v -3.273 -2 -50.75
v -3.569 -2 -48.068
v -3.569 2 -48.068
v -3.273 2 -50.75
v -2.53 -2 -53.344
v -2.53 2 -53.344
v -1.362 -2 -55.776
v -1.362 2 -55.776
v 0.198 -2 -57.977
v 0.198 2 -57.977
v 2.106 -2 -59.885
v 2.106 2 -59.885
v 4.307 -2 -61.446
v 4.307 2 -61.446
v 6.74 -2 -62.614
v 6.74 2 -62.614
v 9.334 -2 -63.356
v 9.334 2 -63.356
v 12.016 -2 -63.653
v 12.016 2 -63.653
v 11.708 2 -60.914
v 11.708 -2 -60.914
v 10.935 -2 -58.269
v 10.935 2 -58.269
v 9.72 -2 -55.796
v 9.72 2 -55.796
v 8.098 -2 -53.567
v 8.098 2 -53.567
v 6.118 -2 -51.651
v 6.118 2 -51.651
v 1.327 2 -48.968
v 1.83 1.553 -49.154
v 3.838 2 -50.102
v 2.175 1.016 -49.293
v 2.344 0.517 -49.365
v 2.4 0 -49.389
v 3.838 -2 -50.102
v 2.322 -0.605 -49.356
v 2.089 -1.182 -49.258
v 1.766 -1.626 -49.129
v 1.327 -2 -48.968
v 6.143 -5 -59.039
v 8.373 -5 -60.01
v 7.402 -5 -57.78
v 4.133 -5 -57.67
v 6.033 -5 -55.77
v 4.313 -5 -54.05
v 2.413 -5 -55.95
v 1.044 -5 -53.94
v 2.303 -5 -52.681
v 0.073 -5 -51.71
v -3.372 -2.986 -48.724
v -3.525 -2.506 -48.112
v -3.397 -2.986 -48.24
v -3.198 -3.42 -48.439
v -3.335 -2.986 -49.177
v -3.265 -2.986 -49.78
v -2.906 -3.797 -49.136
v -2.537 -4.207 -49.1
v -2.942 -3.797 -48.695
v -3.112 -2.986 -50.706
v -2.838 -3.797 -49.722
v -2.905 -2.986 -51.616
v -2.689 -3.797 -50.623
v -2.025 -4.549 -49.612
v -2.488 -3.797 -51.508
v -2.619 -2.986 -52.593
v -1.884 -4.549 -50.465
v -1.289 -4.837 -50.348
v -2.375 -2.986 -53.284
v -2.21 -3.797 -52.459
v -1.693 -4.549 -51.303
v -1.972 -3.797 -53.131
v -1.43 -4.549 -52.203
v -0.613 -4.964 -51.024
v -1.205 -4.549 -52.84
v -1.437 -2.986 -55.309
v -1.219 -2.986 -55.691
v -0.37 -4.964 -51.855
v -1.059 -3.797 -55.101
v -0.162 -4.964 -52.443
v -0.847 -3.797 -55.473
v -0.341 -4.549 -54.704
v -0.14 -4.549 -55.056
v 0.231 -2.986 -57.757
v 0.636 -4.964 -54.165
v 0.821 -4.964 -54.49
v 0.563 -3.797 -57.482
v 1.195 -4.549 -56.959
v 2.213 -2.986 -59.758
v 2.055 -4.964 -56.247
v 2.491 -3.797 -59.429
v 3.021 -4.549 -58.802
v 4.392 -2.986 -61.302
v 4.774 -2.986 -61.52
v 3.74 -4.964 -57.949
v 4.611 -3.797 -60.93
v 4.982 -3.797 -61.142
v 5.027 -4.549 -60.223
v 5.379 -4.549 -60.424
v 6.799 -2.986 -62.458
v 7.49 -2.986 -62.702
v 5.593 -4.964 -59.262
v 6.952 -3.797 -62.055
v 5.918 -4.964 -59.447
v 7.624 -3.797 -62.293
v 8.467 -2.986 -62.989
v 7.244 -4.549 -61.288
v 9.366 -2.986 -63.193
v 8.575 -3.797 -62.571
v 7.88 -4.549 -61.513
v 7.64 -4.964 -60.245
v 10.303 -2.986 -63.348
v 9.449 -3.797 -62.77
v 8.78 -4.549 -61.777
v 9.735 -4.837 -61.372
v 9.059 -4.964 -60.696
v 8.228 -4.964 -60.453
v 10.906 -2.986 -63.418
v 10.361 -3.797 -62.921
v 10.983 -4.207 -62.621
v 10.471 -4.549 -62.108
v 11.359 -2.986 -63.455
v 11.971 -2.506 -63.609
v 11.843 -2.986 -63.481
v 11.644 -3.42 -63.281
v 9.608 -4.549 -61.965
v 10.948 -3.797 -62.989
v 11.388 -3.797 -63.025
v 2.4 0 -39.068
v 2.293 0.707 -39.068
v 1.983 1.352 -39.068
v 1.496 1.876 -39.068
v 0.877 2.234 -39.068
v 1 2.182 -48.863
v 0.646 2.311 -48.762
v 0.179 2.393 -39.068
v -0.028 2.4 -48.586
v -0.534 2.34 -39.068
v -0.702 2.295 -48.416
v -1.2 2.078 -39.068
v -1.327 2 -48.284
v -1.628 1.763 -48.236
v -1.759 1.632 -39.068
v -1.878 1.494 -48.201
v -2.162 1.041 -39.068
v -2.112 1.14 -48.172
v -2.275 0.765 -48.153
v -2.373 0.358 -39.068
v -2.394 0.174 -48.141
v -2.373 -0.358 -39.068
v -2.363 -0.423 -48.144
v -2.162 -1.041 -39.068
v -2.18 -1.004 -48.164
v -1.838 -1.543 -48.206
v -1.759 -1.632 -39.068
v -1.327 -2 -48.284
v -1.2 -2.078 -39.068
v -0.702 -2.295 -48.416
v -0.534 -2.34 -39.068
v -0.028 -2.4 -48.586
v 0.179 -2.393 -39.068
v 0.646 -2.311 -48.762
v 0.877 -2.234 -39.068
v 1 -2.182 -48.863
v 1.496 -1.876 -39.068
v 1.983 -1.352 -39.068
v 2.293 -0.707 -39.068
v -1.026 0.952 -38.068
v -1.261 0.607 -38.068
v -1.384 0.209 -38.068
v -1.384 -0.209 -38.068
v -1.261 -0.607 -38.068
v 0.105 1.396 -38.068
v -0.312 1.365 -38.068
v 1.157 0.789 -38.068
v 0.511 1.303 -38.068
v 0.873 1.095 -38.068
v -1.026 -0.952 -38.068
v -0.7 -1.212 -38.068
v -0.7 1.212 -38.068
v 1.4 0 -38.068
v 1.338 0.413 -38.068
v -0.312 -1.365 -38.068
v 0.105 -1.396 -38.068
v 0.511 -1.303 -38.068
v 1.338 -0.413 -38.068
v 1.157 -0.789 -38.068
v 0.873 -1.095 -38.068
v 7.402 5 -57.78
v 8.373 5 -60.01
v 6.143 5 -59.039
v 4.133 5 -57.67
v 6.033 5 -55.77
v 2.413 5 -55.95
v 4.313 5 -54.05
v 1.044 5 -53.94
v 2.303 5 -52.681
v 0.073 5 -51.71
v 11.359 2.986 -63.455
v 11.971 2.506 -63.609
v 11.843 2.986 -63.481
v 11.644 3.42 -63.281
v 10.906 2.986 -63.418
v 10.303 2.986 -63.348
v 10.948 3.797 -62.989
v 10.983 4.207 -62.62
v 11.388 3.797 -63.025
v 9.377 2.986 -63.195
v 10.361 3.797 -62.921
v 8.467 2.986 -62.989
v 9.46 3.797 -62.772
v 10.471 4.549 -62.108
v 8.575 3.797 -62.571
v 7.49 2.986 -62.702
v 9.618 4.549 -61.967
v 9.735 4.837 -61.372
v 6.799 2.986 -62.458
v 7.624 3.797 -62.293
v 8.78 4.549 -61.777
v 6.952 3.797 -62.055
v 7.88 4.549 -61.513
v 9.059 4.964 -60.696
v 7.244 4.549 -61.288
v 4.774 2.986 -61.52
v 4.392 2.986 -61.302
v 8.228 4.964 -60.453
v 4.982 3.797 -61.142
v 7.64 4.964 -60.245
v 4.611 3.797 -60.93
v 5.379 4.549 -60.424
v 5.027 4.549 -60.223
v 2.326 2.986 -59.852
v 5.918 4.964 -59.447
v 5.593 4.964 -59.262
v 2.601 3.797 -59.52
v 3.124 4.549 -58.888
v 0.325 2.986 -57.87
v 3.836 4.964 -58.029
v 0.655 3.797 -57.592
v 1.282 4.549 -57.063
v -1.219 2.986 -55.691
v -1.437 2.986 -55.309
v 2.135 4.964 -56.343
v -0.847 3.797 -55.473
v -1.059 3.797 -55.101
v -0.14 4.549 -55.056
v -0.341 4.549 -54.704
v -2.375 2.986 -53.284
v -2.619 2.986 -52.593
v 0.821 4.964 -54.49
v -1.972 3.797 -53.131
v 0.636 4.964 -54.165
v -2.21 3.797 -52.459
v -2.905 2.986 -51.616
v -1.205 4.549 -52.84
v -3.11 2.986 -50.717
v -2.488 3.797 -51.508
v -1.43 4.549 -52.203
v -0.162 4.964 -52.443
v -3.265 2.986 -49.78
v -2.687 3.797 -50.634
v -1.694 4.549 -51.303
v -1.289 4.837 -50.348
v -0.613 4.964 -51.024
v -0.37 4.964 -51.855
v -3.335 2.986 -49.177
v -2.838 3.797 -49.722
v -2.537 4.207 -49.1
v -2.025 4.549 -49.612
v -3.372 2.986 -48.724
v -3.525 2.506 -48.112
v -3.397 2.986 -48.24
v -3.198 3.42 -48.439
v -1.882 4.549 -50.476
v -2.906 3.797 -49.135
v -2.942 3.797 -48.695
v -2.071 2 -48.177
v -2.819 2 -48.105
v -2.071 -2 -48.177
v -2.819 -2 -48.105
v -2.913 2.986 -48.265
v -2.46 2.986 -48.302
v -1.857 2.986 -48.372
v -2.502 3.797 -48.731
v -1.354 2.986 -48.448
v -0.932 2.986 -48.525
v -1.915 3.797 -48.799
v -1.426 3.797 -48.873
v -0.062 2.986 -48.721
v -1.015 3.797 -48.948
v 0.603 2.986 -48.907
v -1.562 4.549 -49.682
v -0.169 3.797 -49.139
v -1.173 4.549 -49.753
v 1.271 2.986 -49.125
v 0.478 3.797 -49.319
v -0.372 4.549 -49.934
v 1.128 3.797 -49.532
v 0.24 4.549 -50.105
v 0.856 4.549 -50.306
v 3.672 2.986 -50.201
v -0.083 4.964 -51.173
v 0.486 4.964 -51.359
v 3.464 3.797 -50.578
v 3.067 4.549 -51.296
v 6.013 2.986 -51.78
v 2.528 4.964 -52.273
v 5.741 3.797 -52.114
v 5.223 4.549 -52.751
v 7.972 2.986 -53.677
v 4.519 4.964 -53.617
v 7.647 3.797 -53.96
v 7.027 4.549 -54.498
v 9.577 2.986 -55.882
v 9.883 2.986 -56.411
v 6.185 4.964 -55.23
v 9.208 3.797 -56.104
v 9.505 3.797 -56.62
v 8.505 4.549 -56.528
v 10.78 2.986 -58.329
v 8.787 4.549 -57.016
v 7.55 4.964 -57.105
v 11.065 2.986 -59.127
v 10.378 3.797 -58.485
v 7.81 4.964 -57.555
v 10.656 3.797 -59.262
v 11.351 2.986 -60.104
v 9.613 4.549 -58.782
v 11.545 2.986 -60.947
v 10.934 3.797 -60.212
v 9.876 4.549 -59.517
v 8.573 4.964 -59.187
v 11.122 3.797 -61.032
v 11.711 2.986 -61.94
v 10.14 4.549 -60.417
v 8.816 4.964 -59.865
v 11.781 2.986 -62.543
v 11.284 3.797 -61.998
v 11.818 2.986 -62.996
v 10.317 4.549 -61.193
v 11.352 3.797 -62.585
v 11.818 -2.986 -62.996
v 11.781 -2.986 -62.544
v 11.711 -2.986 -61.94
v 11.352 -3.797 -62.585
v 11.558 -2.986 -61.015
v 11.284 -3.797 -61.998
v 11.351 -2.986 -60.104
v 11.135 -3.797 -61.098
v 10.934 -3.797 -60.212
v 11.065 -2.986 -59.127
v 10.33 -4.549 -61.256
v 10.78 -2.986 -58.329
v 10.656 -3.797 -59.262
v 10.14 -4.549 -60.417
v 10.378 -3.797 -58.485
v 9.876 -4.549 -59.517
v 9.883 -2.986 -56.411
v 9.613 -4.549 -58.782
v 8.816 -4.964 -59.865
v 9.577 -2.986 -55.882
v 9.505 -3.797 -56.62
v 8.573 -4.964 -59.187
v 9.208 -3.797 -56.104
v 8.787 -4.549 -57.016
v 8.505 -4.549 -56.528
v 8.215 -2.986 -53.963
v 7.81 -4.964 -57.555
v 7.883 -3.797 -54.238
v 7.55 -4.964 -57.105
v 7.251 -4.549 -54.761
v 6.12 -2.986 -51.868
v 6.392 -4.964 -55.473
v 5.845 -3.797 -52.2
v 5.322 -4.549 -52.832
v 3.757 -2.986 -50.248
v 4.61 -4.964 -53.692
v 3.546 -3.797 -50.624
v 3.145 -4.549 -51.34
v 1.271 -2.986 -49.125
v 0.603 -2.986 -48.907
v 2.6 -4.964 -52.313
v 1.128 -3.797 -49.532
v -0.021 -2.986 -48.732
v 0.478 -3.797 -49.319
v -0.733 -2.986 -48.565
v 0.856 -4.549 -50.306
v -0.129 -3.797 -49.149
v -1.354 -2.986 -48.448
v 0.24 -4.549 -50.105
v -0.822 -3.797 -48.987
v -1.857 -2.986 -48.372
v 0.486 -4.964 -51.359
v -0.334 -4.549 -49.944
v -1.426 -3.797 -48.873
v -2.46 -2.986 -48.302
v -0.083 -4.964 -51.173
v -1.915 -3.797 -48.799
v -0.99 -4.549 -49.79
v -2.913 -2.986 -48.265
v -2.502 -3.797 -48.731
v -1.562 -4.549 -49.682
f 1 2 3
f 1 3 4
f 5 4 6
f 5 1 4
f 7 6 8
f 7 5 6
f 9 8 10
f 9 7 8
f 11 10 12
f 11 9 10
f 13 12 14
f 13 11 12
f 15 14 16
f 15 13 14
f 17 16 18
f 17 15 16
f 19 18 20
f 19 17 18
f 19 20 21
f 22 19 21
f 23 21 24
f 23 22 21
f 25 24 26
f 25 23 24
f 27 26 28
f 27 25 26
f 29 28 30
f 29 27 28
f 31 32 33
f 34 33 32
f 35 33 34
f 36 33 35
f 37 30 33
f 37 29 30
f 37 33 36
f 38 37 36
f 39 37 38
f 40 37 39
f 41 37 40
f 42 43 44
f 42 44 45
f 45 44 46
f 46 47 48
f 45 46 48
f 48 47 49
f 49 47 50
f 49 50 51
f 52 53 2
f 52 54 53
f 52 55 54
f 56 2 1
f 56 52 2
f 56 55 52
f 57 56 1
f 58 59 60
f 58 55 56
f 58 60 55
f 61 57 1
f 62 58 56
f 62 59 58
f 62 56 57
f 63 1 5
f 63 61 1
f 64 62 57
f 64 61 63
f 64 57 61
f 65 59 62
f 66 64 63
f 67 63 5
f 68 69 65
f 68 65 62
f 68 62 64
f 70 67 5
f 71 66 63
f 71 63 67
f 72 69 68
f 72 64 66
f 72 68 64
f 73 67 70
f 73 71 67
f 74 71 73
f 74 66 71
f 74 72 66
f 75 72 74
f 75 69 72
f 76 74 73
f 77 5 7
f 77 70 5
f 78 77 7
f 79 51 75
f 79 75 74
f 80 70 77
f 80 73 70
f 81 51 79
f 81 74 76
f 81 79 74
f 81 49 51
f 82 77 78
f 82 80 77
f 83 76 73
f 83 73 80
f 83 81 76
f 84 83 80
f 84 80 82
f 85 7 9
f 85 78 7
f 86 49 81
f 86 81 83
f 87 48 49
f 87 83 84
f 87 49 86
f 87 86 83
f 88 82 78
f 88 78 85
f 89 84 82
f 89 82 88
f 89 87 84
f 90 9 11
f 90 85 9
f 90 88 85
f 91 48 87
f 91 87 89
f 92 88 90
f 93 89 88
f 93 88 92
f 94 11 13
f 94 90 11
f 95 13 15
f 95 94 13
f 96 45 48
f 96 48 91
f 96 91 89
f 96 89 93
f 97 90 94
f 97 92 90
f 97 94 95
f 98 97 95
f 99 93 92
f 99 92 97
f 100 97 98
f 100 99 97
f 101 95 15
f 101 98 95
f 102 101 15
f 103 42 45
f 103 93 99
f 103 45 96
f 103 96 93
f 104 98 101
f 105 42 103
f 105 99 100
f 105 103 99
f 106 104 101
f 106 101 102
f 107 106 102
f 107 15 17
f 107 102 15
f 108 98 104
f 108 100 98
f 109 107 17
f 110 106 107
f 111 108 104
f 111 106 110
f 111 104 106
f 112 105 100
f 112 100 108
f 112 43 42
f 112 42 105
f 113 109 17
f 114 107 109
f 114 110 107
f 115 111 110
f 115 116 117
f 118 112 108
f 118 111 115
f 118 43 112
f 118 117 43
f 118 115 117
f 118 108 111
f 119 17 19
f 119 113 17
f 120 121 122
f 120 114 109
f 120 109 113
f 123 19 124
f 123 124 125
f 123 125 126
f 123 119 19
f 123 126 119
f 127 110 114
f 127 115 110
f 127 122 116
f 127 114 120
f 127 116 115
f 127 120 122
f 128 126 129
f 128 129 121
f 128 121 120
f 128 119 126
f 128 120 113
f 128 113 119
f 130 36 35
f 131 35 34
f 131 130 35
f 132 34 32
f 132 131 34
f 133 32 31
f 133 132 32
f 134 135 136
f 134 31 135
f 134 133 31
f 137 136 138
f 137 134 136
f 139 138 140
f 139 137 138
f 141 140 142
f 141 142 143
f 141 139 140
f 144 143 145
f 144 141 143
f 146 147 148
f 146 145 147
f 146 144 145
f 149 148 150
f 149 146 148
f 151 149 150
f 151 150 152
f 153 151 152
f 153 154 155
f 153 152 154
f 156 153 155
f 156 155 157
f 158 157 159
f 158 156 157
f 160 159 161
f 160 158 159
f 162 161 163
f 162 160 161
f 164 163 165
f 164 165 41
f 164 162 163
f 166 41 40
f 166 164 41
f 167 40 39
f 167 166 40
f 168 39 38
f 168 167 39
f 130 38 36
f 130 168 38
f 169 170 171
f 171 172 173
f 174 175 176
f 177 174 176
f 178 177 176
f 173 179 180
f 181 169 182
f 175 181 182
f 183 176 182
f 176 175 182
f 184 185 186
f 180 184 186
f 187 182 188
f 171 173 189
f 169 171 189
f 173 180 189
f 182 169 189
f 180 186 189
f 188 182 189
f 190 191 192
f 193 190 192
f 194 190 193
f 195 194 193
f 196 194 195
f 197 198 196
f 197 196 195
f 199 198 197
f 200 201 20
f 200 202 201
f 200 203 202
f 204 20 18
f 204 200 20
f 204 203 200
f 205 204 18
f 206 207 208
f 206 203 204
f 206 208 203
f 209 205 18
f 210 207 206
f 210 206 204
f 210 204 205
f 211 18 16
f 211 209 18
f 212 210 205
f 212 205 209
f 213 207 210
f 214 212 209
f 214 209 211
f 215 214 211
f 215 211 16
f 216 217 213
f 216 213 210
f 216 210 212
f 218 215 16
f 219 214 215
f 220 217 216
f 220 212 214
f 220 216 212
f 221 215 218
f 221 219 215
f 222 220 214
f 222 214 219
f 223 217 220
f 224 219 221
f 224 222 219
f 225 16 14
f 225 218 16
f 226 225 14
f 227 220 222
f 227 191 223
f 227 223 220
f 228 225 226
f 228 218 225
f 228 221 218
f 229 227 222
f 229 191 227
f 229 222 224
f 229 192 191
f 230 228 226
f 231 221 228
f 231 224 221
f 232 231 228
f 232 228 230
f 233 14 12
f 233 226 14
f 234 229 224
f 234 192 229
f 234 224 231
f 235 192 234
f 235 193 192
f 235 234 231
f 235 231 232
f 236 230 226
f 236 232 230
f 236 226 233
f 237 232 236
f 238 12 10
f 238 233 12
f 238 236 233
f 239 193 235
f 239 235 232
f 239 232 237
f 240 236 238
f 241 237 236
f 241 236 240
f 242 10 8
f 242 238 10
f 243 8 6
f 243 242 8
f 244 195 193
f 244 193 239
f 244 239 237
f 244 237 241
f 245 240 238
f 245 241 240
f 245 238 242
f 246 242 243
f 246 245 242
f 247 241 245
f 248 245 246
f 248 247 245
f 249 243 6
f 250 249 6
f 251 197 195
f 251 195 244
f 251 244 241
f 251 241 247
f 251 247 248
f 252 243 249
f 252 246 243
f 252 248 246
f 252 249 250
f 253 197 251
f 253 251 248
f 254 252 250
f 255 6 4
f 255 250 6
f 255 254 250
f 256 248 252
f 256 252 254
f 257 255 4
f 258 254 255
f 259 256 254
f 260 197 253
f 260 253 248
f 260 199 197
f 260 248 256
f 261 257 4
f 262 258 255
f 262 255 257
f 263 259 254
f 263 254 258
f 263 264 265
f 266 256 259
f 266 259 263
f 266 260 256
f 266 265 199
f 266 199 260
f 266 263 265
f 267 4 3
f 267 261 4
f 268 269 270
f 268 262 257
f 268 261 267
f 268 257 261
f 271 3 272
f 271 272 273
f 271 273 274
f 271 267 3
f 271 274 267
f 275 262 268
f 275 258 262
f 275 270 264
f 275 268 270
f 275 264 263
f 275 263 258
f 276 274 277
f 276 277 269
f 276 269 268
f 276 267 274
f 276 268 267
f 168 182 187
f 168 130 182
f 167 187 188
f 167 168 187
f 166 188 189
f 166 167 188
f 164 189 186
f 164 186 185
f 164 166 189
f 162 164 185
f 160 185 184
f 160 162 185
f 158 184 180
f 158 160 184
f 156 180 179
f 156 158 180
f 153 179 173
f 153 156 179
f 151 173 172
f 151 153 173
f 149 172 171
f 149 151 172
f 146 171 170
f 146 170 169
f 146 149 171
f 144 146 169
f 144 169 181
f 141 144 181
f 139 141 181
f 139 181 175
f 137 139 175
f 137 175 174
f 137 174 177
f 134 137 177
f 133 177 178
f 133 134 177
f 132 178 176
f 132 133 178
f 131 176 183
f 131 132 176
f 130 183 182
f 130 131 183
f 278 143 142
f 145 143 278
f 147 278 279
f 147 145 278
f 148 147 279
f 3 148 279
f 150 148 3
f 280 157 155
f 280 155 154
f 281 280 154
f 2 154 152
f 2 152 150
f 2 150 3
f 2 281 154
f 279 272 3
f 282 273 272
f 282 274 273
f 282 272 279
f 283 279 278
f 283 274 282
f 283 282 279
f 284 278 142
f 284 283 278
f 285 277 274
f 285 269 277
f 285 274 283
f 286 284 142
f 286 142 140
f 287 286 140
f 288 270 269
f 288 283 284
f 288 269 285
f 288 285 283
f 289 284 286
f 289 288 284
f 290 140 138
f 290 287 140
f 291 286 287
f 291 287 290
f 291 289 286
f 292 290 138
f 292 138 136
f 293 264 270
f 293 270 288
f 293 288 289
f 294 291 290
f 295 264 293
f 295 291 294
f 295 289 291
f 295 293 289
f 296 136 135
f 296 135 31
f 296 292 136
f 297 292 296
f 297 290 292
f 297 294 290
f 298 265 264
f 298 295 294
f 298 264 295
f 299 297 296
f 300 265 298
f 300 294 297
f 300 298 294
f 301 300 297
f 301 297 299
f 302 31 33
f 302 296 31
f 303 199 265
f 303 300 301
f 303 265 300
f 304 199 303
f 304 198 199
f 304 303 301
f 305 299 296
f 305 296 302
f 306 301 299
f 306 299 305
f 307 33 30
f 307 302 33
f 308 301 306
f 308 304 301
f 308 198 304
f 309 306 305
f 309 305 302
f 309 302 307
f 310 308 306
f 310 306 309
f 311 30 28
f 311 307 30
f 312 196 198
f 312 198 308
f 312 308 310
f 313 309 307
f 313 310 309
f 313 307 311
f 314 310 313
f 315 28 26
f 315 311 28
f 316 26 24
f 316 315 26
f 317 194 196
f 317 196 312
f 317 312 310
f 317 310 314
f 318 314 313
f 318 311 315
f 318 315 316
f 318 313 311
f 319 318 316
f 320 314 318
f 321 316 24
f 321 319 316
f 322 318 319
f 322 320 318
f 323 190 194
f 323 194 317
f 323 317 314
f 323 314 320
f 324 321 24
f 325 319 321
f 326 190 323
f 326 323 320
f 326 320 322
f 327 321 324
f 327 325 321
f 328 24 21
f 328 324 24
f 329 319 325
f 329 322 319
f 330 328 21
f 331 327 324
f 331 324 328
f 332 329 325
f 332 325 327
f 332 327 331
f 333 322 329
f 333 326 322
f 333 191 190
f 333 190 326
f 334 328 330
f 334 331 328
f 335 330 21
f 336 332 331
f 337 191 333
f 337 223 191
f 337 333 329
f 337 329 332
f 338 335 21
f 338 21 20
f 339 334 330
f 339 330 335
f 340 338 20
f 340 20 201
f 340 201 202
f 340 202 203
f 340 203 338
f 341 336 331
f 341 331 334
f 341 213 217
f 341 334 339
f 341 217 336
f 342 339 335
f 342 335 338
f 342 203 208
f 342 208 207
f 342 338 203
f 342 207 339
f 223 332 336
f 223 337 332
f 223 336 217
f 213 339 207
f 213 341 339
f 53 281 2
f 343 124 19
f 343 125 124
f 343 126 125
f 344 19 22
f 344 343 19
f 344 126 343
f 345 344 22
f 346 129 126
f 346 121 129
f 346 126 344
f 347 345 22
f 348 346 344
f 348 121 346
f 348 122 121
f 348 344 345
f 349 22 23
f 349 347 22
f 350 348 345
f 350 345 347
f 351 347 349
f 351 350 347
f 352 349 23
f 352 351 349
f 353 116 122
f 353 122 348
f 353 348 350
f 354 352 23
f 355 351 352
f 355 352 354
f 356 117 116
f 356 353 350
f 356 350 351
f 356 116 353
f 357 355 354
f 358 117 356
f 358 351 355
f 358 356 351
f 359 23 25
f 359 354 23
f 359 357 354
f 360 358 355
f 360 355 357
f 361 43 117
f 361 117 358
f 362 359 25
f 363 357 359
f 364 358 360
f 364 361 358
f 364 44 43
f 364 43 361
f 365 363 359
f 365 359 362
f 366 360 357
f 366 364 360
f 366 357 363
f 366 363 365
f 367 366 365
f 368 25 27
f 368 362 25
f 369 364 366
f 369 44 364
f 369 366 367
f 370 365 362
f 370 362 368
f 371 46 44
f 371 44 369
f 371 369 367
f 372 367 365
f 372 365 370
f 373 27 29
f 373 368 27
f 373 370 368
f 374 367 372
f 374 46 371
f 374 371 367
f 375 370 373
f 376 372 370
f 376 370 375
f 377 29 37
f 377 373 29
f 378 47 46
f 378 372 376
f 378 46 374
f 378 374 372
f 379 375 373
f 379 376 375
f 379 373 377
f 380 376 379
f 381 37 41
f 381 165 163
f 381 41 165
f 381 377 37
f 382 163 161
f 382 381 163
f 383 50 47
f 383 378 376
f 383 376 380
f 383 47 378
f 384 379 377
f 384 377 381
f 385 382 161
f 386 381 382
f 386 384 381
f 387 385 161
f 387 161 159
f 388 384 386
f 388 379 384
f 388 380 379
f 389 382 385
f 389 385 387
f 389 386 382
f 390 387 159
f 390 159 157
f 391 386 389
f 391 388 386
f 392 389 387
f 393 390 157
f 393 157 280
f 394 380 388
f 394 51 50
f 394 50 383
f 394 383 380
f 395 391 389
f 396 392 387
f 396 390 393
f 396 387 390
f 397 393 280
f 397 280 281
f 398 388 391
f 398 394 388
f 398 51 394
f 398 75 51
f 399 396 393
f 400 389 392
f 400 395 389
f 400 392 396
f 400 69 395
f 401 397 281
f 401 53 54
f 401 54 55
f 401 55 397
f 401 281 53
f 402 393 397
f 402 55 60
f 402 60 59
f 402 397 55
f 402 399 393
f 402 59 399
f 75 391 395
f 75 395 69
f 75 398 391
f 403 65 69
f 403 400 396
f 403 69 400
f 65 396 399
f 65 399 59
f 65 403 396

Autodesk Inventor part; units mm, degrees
ref_plane "YZ Plane" through (0, 0, 0) normal (1, 0, 0) x (0, 1, 0)
ref_plane "XZ Plane" through (0, 0, 0) normal (0, 1, 0) x (-1, 0, 0)
ref_plane "XY Plane" through (0, 0, 0) normal (0, 0, 1) x (1, 0, 0)
sketch "Sketch2" plane through (0, 0, 0) normal (0, 1, 0) x (-1, 0, 0)
  line L0 (0, 0) -> (-15.380673, 0) construction
  line L1 (0, 12) -> (0, -86.646063) construction
  circle A0 centre (0, 0) radius 2
  circle A1 centre (-12, 0) radius 10
  circle A2 centre (-23.313708, -11.313708) radius 6
  circle A3 centre (-16, -32.062435) radius 16
  line L2 (-16, -48.062435) -> (0, -48.062435)
  line L3 (-12, 10) -> (0, 10)
  line L4 (-12, 0) -> (-23.313708, -11.313708)
  arc A4 (-19.562803, 6.542477) -> (-31.877188, -34.041046) centre (19.892258, -27.589553) ccw
  line L5 (0, 0) -> (15.380673, 0) construction
  circle A5 centre (0, 0) radius 2
  circle A6 centre (12, 0) radius 10
  circle A7 centre (23.313708, -11.313708) radius 6
  circle A8 centre (16, -32.062435) radius 16
  line L6 (16, -48.062435) -> (0, -48.062435)
  line L7 (12, 10) -> (0, 10)
  line L8 (12, 0) -> (23.313708, -11.313708)
  arc A9 (31.877188, -34.041046) -> (19.562803, 6.542477) centre (-19.892258, -27.589553) ccw
  arc A10 (10.751933, -47.177256) -> (0, -45.834116) centre (2.223823, -71.738838) ccw
  arc A11 (0, 6.931712) -> (7.2, 8.772685) centre (0, 21.931712) ccw
  arc A12 (0, -45.834116) -> (-10.751933, -47.177256) centre (-2.223823, -71.738838) ccw
  arc A13 (-7.2, 8.772685) -> (0, 6.931712) centre (0, 21.931712) ccw
  line L9 (-23.313708, -11.313708) -> (-58.366086, -46.366086)
  line L10 (-12, 0) -> (-38.351414, 26.351414)
  line L11 (10.154637, -70.237898) -> (-38.67512, -21.408141)
  circle A14 centre (-36.041631, -24.041631) radius 16
  circle A15 centre (-12.425271, -47.65799) radius 16
  circle A16 centre (3.979174, -64.062435) radius 16
  line L12 (0, 10) -> (0, -48.062435)
  point P0 (3.569483, -48.067681)
  point P1 (-12.01558, -63.652744)
  point P2 (-7.2, 8.772685)
  point P3 (-29.089266, -9.631057)
  point P4 (-30.409272, -39.017496)
  point P5 (-10.751933, -47.177256)
  point P6 (-21.637972, -17.07495)
  point P7 (-21.319061, -16.972452)
  point P8 (-21.632358, -17.08657)
  point P9 (-29.07495, -9.637972)
  point P10 (-32.277182, -27.80608)
  point P11 (-31.595554, -28.487707)
  point P12 (0, -45.834116)
  point P13 (-28.928532, -9.198584)
  dimension "d0" = 4
  dimension "d1" = 20
  dimension "d2" = 12
  dimension "d3" = 32
  dimension "d4" = 135
  dimension "d6" = 26
  dimension "d7" = 15
  dimension "d8" = 90
  dimension "d12" = 34
  dimension "d13" = 32
  dimension "d14" = 32
  dimension "d15" = 32
sketch "Sketch9" plane through (0, 0, 0) normal (0, 1, 0) x (-1, 0, 0)
  point P0 (0, 0)
sketch "Sketch2 outline for Extrusion5" plane through (0, 0, 0) normal (0, 1, 0) x (-1, 0, 0)
  arc A0 (3.569483, -48.067681) -> (-12.01558, -63.652744) centre (3.979174, -64.062435) ccw
  arc A1 (-12.01558, -63.652744) -> (3.569483, -48.067681) centre (-12.425271, -47.65799) ccw
extrude "Extrusion5" add sketch "Sketch2 outline for Extrusion5" along normal mid plane 10
fillet "Fillet1" radius 3 4 edges at (7.3345, 5, -52.7487) (1.1116, 5, -58.9717) (7.3345, -5, -52.7487) (1.1116, -5, -58.9717)
sketch "Sketch11" plane through (0, 0, 0) normal (0, 1, 0) x (-1, 0, 0)
  line L0 (0, -51.926604) -> (-2.4, -51.926604)
  line L1 (-2.4, -51.926604) -> (-2.4, -38.067681)
  line L2 (-2.4, -38.067681) -> (0, -38.067681)
  line L3 (0, -38.067681) -> (0, -51.926604)
  arc A0 (-12.01558, -63.652744) -> (3.569483, -48.067681) centre (-12.425271, -47.65799) ccw construction
  line L4 (3.569483, -48.067681) -> (-7.561691, -48.067681)
  point P0 (0, 0)
  dimension "d48" = 10
  dimension "d49" = 4.8
  dimension "d50" = 0
revolve "Revolution3" add sketch "Sketch11" angle 360 about axis through (0, 0, -38.067681) along (0, 0, -1)
chamfer "Chamfer5" distance 1 angle 45 1 edges at (-2.4, 0, -38.0677)
sketch "Sketch5" plane through (0, 0, 0) normal (0, 1, 0) x (-1, 0, 0)
  line L0 (-23.313708, -11.313708) -> (-58.366086, -46.366086) construction
  circle A0 centre (-36.041631, -24.041631) radius 16
  line L1 (-36.041631, -24.041631) -> (-36.041631, 0)
  line L2 (0, 0) -> (0, -9.637972)
  line L3 (-29.07495, -9.637972) -> (29.07495, -9.637972) construction
  line L4 (-36.041631, -24.041631) -> (-36.041631, -40.041631)
  point P0 (-36.041631, -8.041631)
sketch "Sketch6" plane through (0, 0, 0) normal (0, 1, 0) x (-1, 0, 0)
  line L0 (40.788427, -34.041046) -> (-37.176167, -34.041046)
  line L1 (-37.176167, -34.041046) -> (-37.176167, -50.872651)
  line L2 (-37.176167, -50.872651) -> (40.788427, -50.872651)
  line L3 (40.788427, -50.872651) -> (40.788427, -34.041046)
  point P0 (0, 0)
  dimension "d34" = 45
  dimension "d35" = 2
sketch "Sketch3" plane through (0, 0, 0) normal (0, -1, 0) x (1, 0, 0)
  line L0 (-51.381118, -10) -> (56.260395, -10)
  line L1 (56.260395, -10) -> (56.260395, -25)
  line L2 (56.260395, -25) -> (-51.381118, -25)
  line L3 (-51.381118, -25) -> (-51.381118, -10)
  point P0 (0, 0)
  dimension "d22" = 15
  dimension "d23" = 10
properties part number "Apple_logo_red"
